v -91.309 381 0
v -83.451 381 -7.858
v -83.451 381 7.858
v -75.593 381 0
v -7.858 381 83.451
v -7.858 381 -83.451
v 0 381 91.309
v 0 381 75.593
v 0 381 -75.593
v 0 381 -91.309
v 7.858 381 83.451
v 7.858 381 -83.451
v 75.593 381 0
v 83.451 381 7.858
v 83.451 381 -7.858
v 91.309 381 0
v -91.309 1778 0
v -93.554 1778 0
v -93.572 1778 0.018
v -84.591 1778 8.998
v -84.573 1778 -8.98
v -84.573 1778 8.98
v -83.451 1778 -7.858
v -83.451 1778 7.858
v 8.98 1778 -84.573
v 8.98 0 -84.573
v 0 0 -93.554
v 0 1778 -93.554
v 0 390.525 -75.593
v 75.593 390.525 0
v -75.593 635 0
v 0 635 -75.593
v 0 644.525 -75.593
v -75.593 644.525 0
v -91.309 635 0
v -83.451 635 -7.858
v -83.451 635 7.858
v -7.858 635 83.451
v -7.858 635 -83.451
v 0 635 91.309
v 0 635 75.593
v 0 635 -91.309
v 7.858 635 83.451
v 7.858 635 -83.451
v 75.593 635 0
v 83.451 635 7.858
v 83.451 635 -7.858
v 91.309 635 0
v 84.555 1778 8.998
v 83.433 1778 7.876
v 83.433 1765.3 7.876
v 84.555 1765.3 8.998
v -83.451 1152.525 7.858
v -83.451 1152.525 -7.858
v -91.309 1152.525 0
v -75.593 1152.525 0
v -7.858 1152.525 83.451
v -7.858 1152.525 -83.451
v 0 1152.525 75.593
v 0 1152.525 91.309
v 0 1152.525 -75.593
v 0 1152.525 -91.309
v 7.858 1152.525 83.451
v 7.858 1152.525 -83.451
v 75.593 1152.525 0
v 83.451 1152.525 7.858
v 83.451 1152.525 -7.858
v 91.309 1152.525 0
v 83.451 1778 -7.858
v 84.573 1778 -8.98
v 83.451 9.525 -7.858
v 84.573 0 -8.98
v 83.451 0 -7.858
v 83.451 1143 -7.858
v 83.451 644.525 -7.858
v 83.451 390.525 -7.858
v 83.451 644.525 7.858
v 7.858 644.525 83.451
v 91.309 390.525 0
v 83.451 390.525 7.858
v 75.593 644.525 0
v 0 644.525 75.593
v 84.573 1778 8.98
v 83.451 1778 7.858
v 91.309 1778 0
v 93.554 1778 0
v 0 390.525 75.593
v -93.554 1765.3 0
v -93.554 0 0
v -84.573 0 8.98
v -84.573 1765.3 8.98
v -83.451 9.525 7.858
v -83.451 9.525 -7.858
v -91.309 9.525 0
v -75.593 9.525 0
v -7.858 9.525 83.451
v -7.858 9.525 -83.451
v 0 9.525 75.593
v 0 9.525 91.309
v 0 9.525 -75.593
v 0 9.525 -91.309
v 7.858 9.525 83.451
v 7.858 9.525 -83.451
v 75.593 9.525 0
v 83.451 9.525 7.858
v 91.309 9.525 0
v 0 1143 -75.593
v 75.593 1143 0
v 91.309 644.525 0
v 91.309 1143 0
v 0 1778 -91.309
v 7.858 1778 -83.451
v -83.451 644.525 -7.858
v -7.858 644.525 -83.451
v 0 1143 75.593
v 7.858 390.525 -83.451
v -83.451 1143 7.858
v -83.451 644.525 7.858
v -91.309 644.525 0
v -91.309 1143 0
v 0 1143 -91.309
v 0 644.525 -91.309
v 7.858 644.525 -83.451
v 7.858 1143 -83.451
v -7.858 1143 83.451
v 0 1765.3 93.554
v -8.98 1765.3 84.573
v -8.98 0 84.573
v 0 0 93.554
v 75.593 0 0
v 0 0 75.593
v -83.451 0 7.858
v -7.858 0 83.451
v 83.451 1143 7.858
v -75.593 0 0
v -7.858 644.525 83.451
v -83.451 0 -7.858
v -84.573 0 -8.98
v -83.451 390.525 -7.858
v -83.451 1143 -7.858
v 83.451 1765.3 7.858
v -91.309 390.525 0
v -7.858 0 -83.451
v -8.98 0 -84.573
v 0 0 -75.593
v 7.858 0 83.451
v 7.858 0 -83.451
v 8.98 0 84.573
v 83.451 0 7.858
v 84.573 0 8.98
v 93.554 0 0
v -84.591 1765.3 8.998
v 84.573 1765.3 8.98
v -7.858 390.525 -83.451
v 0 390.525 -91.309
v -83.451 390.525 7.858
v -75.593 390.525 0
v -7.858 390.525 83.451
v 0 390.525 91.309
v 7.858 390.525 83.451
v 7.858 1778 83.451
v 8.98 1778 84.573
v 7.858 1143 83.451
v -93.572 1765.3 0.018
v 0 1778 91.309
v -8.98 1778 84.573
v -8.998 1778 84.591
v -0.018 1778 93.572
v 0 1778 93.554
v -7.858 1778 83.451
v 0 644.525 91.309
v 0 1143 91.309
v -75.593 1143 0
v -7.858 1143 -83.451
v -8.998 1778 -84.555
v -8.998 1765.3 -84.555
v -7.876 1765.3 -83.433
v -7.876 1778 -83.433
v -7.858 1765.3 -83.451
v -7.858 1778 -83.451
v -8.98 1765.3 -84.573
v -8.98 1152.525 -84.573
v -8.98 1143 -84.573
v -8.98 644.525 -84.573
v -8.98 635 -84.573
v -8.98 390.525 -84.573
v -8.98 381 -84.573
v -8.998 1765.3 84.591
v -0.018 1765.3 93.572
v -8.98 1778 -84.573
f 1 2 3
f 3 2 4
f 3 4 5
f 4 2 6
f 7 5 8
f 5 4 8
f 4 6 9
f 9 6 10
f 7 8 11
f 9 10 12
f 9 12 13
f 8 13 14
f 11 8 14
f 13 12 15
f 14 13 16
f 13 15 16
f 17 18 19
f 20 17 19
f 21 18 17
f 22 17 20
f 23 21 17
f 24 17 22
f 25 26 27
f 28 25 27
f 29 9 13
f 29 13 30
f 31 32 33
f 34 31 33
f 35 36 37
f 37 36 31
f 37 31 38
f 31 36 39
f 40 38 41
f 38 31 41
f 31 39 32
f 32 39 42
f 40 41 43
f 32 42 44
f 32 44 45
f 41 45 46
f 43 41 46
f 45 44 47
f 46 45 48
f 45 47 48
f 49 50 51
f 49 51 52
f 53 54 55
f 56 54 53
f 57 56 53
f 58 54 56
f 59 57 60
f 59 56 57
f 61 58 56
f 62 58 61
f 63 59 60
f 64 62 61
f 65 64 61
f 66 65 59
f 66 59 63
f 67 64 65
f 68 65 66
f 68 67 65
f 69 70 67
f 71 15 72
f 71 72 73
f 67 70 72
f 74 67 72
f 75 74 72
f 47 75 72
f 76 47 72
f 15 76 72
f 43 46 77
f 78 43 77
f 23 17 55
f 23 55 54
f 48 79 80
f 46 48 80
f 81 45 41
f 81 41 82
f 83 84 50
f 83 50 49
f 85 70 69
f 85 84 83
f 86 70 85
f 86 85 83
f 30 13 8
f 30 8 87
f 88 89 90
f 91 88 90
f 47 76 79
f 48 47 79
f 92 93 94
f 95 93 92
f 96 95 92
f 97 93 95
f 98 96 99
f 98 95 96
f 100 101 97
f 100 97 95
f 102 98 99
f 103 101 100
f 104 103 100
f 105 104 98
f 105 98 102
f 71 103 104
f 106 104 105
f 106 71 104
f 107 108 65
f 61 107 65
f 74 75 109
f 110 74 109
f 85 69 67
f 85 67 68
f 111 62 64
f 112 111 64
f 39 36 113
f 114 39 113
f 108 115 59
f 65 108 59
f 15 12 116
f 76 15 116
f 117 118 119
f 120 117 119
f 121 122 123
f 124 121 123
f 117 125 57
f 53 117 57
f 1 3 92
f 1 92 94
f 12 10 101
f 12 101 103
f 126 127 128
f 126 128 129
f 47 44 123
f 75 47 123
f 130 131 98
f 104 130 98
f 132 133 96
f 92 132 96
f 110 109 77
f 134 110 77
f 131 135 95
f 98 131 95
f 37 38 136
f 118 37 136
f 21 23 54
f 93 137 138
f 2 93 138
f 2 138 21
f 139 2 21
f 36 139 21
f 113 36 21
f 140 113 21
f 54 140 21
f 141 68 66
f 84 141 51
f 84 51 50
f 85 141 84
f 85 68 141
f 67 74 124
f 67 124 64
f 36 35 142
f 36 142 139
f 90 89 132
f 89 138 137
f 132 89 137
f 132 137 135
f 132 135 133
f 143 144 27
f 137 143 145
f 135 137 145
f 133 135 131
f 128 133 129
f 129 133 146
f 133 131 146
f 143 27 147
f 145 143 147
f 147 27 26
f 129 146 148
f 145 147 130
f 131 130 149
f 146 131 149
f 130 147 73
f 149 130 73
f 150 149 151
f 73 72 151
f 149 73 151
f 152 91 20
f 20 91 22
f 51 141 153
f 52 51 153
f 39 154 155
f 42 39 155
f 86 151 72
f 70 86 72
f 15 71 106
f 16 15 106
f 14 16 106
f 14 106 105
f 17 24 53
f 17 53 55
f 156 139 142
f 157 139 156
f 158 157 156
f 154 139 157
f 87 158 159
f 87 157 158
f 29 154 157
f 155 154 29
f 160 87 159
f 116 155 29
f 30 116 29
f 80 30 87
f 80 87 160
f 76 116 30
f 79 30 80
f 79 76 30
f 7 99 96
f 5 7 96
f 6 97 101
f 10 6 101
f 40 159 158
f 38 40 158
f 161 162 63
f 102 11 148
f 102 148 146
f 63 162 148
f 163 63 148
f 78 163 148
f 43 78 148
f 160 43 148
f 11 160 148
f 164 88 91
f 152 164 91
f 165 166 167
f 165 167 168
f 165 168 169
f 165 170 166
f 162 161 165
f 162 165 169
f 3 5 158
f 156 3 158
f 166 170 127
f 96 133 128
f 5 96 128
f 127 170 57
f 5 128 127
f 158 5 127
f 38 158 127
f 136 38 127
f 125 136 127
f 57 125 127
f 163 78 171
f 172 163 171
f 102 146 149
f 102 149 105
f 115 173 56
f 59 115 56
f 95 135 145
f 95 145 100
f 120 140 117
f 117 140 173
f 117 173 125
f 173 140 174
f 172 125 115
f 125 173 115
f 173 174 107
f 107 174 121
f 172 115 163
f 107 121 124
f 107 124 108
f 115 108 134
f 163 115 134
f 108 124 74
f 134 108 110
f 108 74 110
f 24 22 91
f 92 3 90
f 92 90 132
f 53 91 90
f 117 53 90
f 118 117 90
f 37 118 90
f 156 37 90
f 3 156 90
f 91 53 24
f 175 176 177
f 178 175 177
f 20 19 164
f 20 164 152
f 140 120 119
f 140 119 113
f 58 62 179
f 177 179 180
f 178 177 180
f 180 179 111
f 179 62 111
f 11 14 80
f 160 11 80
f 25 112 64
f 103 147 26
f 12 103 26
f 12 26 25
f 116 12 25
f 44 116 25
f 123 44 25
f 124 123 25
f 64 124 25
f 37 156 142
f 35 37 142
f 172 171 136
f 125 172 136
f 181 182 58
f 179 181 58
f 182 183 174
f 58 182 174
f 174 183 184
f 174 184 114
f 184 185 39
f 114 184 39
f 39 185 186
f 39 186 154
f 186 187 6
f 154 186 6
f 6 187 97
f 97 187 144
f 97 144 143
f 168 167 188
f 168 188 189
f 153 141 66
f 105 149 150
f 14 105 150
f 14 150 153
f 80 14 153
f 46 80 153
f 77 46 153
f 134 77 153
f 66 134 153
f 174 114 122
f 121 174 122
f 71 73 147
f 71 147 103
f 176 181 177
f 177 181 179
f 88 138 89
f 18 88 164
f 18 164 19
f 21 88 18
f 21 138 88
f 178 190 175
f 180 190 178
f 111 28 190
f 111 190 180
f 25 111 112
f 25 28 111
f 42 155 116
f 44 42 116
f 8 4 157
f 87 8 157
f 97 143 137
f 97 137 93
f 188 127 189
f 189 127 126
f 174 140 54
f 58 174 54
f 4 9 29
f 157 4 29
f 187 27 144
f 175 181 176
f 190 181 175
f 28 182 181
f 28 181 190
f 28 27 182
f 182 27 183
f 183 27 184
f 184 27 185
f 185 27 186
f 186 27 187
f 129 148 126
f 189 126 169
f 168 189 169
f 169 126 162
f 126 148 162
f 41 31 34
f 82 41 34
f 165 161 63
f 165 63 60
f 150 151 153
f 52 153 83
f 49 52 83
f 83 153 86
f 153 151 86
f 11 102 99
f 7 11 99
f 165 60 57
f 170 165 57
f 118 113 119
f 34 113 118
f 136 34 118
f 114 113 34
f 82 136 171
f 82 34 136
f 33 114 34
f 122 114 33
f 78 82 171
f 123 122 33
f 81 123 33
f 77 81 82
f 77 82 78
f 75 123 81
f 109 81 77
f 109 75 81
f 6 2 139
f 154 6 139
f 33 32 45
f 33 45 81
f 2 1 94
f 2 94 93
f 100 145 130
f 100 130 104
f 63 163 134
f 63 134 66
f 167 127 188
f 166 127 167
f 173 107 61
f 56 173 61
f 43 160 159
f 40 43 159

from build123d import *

# Parameters (mm, degrees)
BOSS_EXTRUDE6_DEPTH   = 1778
BOSS_EXTRUDE6_2_DEPTH = 1778
BOSS_EXTRUDE6_3_DEPTH = 1778
BOSS_EXTRUDE6_4_DEPTH = 1778
SKETCH11_W            = 11.1125
SKETCH11_H            = 9.525
BOSS_EXTRUDE11_DEPTH  = 129.12986
SKETCH13_W            = 11.1125
SKETCH13_H            = 9.525
BOSS_EXTRUDE13_DEPTH  = 118.01736
SKETCH14_W            = 11.1125
SKETCH14_H            = 9.525
BOSS_EXTRUDE14_DEPTH  = 119.60486
SKETCH15_W            = 11.1125
SKETCH15_H            = 9.525
BOSS_EXTRUDE15_DEPTH  = 106.90486
LPATTERN1_COUNT       = 2
LPATTERN1_PITCH       = 381
LPATTERN2_COUNT       = 2
LPATTERN2_PITCH       = 635
LPATTERN3_COUNT       = 2
LPATTERN3_PITCH       = 1143
SKETCH16_W            = 12.7
SKETCH16_H            = 12.7
BOSS_EXTRUDE16_DEPTH  = 0.0254
SKETCH17_W            = 12.7
SKETCH17_H            = 12.7
BOSS_EXTRUDE17_DEPTH  = 0.0254
SKETCH18_W            = 1.5875
SKETCH18_H            = 12.7
BOSS_EXTRUDE18_DEPTH  = 0.0254
SKETCH19_W            = 1.5875
SKETCH19_H            = 12.7
BOSS_EXTRUDE19_DEPTH  = 0.0254


with BuildPart() as part:
    # Sketch2 → Boss-Extrude6 (new body)
    with BuildSketch(Plane(origin=(0, 0, 0), x_dir=(1, 0, 0), z_dir=(0, 1, 0))):
        Polygon((0, 93.553663338), (-8.980256121, 84.573407217), (-7.857724106, 83.450875201), (0, 91.308599307), (7.857724106, 83.450875201), (8.980256121, 84.573407217), align=None)
    extrude(amount=BOSS_EXTRUDE6_DEPTH)



with BuildPart() as body_2:
    # Sketch2 → Boss-Extrude6 2 (new body)
    with BuildSketch(Plane(origin=(0, 0, 0), x_dir=(1, 0, 0), z_dir=(0, 1, 0))):
        Polygon((93.553663338, 0), (84.573407217, 8.980256121), (83.450875201, 7.857724106), (91.308599307, 0), (83.450875201, -7.857724106), (84.573407217, -8.980256121), align=None)
    extrude(amount=BOSS_EXTRUDE6_2_DEPTH)



with BuildPart() as body_3:
    # Sketch2 → Boss-Extrude6 3 (new body)
    with BuildSketch(Plane(origin=(0, 0, 0), x_dir=(1, 0, 0), z_dir=(0, 1, 0))):
        Polygon((0, -93.553663338), (8.980256121, -84.573407217), (7.857724106, -83.450875201), (0, -91.308599307), (-7.857724106, -83.450875201), (-8.980256121, -84.573407217), align=None)
    extrude(amount=BOSS_EXTRUDE6_3_DEPTH)



with BuildPart() as body_4:
    # Sketch2 → Boss-Extrude6 4 (new body)
    with BuildSketch(Plane(origin=(0, 0, 0), x_dir=(1, 0, 0), z_dir=(0, 1, 0))):
        Polygon((-93.553663338, 0), (-84.573407217, -8.980256121), (-83.450875201, -7.857724106), (-91.308599307, 0), (-83.450875201, 7.857724106), (-84.573407217, 8.980256121), align=None)
    extrude(amount=BOSS_EXTRUDE6_4_DEPTH)


with BuildPart() as body_3_1:
    add(body_3.part)

    add(body_4.part)  # Boss-Extrude11 merges body 4
    # Sketch11 → Boss-Extrude11 (add)
    with BuildSketch(Plane(origin=(-45.654299654, 0, -45.654299654), x_dir=(0.707106781, 0, -0.707106781), z_dir=(0.707106781, 0, 0.707106781))):
        with Locations((-59.008679751, 4.7625)):
            Rectangle(SKETCH11_W, SKETCH11_H)
    boss_extrude11 = extrude(amount=BOSS_EXTRUDE11_DEPTH)


with BuildPart() as body_2_1:
    add(body_2.part)

    add(body_3_1.part)  # Boss-Extrude13 merges body 3
    # Sketch13 → Boss-Extrude13 (add)
    with BuildSketch(Plane(origin=(-37.796575548, 0, 37.796575548), x_dir=(-0.707106781, 0, -0.707106781), z_dir=(0.707106781, 0, -0.707106781))):
        with Locations((-59.008679751, 4.7625)):
            Rectangle(SKETCH13_W, SKETCH13_H)
    boss_extrude13 = extrude(amount=BOSS_EXTRUDE13_DEPTH)


with BuildPart() as part_1:
    add(part.part)

    add(body_2_1.part)  # Boss-Extrude14 merges body 2
    # Sketch14 → Boss-Extrude14 (add)
    with BuildSketch(Plane(origin=(37.796575548, 0, 37.796575548), x_dir=(-0.707106781, 0, 0.707106781), z_dir=(-0.707106781, 0, -0.707106781))):
        with Locations((-59.008679751, 4.7625)):
            Rectangle(SKETCH14_W, SKETCH14_H)
    boss_extrude14 = extrude(amount=BOSS_EXTRUDE14_DEPTH)

    # Sketch15 → Boss-Extrude15 (add)
    with BuildSketch(Plane(origin=(37.796575548, 0, -37.796575548), x_dir=(0.707106781, 0, 0.707106781), z_dir=(-0.707106781, 0, 0.707106781))):
        with Locations((-59.008679751, 4.7625)):
            Rectangle(SKETCH15_W, SKETCH15_H)
    boss_extrude15 = extrude(amount=BOSS_EXTRUDE15_DEPTH)

    # LPattern1: Boss-Extrude11, Boss-Extrude13, Boss-Extrude14, Boss-Extrude15 ×2
    with Locations(*[(0, i * LPATTERN1_PITCH, 0) for i in range(1, LPATTERN1_COUNT)]):
        add(boss_extrude11)
        add(boss_extrude13)
        add(boss_extrude14)
        add(boss_extrude15)

    # LPattern2: Boss-Extrude11, Boss-Extrude13, Boss-Extrude14, Boss-Extrude15 ×2
    with Locations(*[(0, i * LPATTERN2_PITCH, 0) for i in range(1, LPATTERN2_COUNT)]):
        add(boss_extrude11)
        add(boss_extrude13)
        add(boss_extrude14)
        add(boss_extrude15)

    # LPattern3: Boss-Extrude11, Boss-Extrude13, Boss-Extrude14, Boss-Extrude15 ×2
    with Locations(*[(0, i * LPATTERN3_PITCH, 0) for i in range(1, LPATTERN3_COUNT)]):
        add(boss_extrude11)
        add(boss_extrude13)
        add(boss_extrude14)
        add(boss_extrude15)

    # Sketch16 → Boss-Extrude16 (add)
    with BuildSketch(Plane(origin=(-46.776831669, 0, 46.776831669), x_dir=(0.707106781, 0, 0.707106781), z_dir=(-0.707106781, 0, 0.707106781))):
        with Locations((-59.802429751, 1771.65)):
            Rectangle(SKETCH16_W, SKETCH16_H)
    extrude(amount=BOSS_EXTRUDE16_DEPTH)

    # Sketch17 → Boss-Extrude17 (add)
    with BuildSketch(Plane(origin=(-46.776831669, 0, 46.776831669), x_dir=(0.707106781, 0, 0.707106781), z_dir=(-0.707106781, 0, 0.707106781))):
        with Locations((59.802429751, 1771.65)):
            Rectangle(SKETCH17_W, SKETCH17_H)
    extrude(amount=BOSS_EXTRUDE17_DEPTH)

    # Sketch18 → Boss-Extrude18 (add)
    with BuildSketch(Plane(origin=(37.796575548, 0, -37.796575548), x_dir=(0.707106781, 0, 0.707106781), z_dir=(-0.707106781, 0, 0.707106781))):
        with Locations((-65.358679751, 1771.65)):
            Rectangle(SKETCH18_W, SKETCH18_H)
    extrude(amount=BOSS_EXTRUDE18_DEPTH)

    # Sketch19 → Boss-Extrude19 (add)
    with BuildSketch(Plane(origin=(37.796575548, 0, -37.796575548), x_dir=(0.707106781, 0, 0.707106781), z_dir=(-0.707106781, 0, 0.707106781))):
        with Locations((65.358679751, 1771.65)):
            Rectangle(SKETCH19_W, SKETCH19_H)
    extrude(amount=BOSS_EXTRUDE19_DEPTH)


solid = part_1.part
